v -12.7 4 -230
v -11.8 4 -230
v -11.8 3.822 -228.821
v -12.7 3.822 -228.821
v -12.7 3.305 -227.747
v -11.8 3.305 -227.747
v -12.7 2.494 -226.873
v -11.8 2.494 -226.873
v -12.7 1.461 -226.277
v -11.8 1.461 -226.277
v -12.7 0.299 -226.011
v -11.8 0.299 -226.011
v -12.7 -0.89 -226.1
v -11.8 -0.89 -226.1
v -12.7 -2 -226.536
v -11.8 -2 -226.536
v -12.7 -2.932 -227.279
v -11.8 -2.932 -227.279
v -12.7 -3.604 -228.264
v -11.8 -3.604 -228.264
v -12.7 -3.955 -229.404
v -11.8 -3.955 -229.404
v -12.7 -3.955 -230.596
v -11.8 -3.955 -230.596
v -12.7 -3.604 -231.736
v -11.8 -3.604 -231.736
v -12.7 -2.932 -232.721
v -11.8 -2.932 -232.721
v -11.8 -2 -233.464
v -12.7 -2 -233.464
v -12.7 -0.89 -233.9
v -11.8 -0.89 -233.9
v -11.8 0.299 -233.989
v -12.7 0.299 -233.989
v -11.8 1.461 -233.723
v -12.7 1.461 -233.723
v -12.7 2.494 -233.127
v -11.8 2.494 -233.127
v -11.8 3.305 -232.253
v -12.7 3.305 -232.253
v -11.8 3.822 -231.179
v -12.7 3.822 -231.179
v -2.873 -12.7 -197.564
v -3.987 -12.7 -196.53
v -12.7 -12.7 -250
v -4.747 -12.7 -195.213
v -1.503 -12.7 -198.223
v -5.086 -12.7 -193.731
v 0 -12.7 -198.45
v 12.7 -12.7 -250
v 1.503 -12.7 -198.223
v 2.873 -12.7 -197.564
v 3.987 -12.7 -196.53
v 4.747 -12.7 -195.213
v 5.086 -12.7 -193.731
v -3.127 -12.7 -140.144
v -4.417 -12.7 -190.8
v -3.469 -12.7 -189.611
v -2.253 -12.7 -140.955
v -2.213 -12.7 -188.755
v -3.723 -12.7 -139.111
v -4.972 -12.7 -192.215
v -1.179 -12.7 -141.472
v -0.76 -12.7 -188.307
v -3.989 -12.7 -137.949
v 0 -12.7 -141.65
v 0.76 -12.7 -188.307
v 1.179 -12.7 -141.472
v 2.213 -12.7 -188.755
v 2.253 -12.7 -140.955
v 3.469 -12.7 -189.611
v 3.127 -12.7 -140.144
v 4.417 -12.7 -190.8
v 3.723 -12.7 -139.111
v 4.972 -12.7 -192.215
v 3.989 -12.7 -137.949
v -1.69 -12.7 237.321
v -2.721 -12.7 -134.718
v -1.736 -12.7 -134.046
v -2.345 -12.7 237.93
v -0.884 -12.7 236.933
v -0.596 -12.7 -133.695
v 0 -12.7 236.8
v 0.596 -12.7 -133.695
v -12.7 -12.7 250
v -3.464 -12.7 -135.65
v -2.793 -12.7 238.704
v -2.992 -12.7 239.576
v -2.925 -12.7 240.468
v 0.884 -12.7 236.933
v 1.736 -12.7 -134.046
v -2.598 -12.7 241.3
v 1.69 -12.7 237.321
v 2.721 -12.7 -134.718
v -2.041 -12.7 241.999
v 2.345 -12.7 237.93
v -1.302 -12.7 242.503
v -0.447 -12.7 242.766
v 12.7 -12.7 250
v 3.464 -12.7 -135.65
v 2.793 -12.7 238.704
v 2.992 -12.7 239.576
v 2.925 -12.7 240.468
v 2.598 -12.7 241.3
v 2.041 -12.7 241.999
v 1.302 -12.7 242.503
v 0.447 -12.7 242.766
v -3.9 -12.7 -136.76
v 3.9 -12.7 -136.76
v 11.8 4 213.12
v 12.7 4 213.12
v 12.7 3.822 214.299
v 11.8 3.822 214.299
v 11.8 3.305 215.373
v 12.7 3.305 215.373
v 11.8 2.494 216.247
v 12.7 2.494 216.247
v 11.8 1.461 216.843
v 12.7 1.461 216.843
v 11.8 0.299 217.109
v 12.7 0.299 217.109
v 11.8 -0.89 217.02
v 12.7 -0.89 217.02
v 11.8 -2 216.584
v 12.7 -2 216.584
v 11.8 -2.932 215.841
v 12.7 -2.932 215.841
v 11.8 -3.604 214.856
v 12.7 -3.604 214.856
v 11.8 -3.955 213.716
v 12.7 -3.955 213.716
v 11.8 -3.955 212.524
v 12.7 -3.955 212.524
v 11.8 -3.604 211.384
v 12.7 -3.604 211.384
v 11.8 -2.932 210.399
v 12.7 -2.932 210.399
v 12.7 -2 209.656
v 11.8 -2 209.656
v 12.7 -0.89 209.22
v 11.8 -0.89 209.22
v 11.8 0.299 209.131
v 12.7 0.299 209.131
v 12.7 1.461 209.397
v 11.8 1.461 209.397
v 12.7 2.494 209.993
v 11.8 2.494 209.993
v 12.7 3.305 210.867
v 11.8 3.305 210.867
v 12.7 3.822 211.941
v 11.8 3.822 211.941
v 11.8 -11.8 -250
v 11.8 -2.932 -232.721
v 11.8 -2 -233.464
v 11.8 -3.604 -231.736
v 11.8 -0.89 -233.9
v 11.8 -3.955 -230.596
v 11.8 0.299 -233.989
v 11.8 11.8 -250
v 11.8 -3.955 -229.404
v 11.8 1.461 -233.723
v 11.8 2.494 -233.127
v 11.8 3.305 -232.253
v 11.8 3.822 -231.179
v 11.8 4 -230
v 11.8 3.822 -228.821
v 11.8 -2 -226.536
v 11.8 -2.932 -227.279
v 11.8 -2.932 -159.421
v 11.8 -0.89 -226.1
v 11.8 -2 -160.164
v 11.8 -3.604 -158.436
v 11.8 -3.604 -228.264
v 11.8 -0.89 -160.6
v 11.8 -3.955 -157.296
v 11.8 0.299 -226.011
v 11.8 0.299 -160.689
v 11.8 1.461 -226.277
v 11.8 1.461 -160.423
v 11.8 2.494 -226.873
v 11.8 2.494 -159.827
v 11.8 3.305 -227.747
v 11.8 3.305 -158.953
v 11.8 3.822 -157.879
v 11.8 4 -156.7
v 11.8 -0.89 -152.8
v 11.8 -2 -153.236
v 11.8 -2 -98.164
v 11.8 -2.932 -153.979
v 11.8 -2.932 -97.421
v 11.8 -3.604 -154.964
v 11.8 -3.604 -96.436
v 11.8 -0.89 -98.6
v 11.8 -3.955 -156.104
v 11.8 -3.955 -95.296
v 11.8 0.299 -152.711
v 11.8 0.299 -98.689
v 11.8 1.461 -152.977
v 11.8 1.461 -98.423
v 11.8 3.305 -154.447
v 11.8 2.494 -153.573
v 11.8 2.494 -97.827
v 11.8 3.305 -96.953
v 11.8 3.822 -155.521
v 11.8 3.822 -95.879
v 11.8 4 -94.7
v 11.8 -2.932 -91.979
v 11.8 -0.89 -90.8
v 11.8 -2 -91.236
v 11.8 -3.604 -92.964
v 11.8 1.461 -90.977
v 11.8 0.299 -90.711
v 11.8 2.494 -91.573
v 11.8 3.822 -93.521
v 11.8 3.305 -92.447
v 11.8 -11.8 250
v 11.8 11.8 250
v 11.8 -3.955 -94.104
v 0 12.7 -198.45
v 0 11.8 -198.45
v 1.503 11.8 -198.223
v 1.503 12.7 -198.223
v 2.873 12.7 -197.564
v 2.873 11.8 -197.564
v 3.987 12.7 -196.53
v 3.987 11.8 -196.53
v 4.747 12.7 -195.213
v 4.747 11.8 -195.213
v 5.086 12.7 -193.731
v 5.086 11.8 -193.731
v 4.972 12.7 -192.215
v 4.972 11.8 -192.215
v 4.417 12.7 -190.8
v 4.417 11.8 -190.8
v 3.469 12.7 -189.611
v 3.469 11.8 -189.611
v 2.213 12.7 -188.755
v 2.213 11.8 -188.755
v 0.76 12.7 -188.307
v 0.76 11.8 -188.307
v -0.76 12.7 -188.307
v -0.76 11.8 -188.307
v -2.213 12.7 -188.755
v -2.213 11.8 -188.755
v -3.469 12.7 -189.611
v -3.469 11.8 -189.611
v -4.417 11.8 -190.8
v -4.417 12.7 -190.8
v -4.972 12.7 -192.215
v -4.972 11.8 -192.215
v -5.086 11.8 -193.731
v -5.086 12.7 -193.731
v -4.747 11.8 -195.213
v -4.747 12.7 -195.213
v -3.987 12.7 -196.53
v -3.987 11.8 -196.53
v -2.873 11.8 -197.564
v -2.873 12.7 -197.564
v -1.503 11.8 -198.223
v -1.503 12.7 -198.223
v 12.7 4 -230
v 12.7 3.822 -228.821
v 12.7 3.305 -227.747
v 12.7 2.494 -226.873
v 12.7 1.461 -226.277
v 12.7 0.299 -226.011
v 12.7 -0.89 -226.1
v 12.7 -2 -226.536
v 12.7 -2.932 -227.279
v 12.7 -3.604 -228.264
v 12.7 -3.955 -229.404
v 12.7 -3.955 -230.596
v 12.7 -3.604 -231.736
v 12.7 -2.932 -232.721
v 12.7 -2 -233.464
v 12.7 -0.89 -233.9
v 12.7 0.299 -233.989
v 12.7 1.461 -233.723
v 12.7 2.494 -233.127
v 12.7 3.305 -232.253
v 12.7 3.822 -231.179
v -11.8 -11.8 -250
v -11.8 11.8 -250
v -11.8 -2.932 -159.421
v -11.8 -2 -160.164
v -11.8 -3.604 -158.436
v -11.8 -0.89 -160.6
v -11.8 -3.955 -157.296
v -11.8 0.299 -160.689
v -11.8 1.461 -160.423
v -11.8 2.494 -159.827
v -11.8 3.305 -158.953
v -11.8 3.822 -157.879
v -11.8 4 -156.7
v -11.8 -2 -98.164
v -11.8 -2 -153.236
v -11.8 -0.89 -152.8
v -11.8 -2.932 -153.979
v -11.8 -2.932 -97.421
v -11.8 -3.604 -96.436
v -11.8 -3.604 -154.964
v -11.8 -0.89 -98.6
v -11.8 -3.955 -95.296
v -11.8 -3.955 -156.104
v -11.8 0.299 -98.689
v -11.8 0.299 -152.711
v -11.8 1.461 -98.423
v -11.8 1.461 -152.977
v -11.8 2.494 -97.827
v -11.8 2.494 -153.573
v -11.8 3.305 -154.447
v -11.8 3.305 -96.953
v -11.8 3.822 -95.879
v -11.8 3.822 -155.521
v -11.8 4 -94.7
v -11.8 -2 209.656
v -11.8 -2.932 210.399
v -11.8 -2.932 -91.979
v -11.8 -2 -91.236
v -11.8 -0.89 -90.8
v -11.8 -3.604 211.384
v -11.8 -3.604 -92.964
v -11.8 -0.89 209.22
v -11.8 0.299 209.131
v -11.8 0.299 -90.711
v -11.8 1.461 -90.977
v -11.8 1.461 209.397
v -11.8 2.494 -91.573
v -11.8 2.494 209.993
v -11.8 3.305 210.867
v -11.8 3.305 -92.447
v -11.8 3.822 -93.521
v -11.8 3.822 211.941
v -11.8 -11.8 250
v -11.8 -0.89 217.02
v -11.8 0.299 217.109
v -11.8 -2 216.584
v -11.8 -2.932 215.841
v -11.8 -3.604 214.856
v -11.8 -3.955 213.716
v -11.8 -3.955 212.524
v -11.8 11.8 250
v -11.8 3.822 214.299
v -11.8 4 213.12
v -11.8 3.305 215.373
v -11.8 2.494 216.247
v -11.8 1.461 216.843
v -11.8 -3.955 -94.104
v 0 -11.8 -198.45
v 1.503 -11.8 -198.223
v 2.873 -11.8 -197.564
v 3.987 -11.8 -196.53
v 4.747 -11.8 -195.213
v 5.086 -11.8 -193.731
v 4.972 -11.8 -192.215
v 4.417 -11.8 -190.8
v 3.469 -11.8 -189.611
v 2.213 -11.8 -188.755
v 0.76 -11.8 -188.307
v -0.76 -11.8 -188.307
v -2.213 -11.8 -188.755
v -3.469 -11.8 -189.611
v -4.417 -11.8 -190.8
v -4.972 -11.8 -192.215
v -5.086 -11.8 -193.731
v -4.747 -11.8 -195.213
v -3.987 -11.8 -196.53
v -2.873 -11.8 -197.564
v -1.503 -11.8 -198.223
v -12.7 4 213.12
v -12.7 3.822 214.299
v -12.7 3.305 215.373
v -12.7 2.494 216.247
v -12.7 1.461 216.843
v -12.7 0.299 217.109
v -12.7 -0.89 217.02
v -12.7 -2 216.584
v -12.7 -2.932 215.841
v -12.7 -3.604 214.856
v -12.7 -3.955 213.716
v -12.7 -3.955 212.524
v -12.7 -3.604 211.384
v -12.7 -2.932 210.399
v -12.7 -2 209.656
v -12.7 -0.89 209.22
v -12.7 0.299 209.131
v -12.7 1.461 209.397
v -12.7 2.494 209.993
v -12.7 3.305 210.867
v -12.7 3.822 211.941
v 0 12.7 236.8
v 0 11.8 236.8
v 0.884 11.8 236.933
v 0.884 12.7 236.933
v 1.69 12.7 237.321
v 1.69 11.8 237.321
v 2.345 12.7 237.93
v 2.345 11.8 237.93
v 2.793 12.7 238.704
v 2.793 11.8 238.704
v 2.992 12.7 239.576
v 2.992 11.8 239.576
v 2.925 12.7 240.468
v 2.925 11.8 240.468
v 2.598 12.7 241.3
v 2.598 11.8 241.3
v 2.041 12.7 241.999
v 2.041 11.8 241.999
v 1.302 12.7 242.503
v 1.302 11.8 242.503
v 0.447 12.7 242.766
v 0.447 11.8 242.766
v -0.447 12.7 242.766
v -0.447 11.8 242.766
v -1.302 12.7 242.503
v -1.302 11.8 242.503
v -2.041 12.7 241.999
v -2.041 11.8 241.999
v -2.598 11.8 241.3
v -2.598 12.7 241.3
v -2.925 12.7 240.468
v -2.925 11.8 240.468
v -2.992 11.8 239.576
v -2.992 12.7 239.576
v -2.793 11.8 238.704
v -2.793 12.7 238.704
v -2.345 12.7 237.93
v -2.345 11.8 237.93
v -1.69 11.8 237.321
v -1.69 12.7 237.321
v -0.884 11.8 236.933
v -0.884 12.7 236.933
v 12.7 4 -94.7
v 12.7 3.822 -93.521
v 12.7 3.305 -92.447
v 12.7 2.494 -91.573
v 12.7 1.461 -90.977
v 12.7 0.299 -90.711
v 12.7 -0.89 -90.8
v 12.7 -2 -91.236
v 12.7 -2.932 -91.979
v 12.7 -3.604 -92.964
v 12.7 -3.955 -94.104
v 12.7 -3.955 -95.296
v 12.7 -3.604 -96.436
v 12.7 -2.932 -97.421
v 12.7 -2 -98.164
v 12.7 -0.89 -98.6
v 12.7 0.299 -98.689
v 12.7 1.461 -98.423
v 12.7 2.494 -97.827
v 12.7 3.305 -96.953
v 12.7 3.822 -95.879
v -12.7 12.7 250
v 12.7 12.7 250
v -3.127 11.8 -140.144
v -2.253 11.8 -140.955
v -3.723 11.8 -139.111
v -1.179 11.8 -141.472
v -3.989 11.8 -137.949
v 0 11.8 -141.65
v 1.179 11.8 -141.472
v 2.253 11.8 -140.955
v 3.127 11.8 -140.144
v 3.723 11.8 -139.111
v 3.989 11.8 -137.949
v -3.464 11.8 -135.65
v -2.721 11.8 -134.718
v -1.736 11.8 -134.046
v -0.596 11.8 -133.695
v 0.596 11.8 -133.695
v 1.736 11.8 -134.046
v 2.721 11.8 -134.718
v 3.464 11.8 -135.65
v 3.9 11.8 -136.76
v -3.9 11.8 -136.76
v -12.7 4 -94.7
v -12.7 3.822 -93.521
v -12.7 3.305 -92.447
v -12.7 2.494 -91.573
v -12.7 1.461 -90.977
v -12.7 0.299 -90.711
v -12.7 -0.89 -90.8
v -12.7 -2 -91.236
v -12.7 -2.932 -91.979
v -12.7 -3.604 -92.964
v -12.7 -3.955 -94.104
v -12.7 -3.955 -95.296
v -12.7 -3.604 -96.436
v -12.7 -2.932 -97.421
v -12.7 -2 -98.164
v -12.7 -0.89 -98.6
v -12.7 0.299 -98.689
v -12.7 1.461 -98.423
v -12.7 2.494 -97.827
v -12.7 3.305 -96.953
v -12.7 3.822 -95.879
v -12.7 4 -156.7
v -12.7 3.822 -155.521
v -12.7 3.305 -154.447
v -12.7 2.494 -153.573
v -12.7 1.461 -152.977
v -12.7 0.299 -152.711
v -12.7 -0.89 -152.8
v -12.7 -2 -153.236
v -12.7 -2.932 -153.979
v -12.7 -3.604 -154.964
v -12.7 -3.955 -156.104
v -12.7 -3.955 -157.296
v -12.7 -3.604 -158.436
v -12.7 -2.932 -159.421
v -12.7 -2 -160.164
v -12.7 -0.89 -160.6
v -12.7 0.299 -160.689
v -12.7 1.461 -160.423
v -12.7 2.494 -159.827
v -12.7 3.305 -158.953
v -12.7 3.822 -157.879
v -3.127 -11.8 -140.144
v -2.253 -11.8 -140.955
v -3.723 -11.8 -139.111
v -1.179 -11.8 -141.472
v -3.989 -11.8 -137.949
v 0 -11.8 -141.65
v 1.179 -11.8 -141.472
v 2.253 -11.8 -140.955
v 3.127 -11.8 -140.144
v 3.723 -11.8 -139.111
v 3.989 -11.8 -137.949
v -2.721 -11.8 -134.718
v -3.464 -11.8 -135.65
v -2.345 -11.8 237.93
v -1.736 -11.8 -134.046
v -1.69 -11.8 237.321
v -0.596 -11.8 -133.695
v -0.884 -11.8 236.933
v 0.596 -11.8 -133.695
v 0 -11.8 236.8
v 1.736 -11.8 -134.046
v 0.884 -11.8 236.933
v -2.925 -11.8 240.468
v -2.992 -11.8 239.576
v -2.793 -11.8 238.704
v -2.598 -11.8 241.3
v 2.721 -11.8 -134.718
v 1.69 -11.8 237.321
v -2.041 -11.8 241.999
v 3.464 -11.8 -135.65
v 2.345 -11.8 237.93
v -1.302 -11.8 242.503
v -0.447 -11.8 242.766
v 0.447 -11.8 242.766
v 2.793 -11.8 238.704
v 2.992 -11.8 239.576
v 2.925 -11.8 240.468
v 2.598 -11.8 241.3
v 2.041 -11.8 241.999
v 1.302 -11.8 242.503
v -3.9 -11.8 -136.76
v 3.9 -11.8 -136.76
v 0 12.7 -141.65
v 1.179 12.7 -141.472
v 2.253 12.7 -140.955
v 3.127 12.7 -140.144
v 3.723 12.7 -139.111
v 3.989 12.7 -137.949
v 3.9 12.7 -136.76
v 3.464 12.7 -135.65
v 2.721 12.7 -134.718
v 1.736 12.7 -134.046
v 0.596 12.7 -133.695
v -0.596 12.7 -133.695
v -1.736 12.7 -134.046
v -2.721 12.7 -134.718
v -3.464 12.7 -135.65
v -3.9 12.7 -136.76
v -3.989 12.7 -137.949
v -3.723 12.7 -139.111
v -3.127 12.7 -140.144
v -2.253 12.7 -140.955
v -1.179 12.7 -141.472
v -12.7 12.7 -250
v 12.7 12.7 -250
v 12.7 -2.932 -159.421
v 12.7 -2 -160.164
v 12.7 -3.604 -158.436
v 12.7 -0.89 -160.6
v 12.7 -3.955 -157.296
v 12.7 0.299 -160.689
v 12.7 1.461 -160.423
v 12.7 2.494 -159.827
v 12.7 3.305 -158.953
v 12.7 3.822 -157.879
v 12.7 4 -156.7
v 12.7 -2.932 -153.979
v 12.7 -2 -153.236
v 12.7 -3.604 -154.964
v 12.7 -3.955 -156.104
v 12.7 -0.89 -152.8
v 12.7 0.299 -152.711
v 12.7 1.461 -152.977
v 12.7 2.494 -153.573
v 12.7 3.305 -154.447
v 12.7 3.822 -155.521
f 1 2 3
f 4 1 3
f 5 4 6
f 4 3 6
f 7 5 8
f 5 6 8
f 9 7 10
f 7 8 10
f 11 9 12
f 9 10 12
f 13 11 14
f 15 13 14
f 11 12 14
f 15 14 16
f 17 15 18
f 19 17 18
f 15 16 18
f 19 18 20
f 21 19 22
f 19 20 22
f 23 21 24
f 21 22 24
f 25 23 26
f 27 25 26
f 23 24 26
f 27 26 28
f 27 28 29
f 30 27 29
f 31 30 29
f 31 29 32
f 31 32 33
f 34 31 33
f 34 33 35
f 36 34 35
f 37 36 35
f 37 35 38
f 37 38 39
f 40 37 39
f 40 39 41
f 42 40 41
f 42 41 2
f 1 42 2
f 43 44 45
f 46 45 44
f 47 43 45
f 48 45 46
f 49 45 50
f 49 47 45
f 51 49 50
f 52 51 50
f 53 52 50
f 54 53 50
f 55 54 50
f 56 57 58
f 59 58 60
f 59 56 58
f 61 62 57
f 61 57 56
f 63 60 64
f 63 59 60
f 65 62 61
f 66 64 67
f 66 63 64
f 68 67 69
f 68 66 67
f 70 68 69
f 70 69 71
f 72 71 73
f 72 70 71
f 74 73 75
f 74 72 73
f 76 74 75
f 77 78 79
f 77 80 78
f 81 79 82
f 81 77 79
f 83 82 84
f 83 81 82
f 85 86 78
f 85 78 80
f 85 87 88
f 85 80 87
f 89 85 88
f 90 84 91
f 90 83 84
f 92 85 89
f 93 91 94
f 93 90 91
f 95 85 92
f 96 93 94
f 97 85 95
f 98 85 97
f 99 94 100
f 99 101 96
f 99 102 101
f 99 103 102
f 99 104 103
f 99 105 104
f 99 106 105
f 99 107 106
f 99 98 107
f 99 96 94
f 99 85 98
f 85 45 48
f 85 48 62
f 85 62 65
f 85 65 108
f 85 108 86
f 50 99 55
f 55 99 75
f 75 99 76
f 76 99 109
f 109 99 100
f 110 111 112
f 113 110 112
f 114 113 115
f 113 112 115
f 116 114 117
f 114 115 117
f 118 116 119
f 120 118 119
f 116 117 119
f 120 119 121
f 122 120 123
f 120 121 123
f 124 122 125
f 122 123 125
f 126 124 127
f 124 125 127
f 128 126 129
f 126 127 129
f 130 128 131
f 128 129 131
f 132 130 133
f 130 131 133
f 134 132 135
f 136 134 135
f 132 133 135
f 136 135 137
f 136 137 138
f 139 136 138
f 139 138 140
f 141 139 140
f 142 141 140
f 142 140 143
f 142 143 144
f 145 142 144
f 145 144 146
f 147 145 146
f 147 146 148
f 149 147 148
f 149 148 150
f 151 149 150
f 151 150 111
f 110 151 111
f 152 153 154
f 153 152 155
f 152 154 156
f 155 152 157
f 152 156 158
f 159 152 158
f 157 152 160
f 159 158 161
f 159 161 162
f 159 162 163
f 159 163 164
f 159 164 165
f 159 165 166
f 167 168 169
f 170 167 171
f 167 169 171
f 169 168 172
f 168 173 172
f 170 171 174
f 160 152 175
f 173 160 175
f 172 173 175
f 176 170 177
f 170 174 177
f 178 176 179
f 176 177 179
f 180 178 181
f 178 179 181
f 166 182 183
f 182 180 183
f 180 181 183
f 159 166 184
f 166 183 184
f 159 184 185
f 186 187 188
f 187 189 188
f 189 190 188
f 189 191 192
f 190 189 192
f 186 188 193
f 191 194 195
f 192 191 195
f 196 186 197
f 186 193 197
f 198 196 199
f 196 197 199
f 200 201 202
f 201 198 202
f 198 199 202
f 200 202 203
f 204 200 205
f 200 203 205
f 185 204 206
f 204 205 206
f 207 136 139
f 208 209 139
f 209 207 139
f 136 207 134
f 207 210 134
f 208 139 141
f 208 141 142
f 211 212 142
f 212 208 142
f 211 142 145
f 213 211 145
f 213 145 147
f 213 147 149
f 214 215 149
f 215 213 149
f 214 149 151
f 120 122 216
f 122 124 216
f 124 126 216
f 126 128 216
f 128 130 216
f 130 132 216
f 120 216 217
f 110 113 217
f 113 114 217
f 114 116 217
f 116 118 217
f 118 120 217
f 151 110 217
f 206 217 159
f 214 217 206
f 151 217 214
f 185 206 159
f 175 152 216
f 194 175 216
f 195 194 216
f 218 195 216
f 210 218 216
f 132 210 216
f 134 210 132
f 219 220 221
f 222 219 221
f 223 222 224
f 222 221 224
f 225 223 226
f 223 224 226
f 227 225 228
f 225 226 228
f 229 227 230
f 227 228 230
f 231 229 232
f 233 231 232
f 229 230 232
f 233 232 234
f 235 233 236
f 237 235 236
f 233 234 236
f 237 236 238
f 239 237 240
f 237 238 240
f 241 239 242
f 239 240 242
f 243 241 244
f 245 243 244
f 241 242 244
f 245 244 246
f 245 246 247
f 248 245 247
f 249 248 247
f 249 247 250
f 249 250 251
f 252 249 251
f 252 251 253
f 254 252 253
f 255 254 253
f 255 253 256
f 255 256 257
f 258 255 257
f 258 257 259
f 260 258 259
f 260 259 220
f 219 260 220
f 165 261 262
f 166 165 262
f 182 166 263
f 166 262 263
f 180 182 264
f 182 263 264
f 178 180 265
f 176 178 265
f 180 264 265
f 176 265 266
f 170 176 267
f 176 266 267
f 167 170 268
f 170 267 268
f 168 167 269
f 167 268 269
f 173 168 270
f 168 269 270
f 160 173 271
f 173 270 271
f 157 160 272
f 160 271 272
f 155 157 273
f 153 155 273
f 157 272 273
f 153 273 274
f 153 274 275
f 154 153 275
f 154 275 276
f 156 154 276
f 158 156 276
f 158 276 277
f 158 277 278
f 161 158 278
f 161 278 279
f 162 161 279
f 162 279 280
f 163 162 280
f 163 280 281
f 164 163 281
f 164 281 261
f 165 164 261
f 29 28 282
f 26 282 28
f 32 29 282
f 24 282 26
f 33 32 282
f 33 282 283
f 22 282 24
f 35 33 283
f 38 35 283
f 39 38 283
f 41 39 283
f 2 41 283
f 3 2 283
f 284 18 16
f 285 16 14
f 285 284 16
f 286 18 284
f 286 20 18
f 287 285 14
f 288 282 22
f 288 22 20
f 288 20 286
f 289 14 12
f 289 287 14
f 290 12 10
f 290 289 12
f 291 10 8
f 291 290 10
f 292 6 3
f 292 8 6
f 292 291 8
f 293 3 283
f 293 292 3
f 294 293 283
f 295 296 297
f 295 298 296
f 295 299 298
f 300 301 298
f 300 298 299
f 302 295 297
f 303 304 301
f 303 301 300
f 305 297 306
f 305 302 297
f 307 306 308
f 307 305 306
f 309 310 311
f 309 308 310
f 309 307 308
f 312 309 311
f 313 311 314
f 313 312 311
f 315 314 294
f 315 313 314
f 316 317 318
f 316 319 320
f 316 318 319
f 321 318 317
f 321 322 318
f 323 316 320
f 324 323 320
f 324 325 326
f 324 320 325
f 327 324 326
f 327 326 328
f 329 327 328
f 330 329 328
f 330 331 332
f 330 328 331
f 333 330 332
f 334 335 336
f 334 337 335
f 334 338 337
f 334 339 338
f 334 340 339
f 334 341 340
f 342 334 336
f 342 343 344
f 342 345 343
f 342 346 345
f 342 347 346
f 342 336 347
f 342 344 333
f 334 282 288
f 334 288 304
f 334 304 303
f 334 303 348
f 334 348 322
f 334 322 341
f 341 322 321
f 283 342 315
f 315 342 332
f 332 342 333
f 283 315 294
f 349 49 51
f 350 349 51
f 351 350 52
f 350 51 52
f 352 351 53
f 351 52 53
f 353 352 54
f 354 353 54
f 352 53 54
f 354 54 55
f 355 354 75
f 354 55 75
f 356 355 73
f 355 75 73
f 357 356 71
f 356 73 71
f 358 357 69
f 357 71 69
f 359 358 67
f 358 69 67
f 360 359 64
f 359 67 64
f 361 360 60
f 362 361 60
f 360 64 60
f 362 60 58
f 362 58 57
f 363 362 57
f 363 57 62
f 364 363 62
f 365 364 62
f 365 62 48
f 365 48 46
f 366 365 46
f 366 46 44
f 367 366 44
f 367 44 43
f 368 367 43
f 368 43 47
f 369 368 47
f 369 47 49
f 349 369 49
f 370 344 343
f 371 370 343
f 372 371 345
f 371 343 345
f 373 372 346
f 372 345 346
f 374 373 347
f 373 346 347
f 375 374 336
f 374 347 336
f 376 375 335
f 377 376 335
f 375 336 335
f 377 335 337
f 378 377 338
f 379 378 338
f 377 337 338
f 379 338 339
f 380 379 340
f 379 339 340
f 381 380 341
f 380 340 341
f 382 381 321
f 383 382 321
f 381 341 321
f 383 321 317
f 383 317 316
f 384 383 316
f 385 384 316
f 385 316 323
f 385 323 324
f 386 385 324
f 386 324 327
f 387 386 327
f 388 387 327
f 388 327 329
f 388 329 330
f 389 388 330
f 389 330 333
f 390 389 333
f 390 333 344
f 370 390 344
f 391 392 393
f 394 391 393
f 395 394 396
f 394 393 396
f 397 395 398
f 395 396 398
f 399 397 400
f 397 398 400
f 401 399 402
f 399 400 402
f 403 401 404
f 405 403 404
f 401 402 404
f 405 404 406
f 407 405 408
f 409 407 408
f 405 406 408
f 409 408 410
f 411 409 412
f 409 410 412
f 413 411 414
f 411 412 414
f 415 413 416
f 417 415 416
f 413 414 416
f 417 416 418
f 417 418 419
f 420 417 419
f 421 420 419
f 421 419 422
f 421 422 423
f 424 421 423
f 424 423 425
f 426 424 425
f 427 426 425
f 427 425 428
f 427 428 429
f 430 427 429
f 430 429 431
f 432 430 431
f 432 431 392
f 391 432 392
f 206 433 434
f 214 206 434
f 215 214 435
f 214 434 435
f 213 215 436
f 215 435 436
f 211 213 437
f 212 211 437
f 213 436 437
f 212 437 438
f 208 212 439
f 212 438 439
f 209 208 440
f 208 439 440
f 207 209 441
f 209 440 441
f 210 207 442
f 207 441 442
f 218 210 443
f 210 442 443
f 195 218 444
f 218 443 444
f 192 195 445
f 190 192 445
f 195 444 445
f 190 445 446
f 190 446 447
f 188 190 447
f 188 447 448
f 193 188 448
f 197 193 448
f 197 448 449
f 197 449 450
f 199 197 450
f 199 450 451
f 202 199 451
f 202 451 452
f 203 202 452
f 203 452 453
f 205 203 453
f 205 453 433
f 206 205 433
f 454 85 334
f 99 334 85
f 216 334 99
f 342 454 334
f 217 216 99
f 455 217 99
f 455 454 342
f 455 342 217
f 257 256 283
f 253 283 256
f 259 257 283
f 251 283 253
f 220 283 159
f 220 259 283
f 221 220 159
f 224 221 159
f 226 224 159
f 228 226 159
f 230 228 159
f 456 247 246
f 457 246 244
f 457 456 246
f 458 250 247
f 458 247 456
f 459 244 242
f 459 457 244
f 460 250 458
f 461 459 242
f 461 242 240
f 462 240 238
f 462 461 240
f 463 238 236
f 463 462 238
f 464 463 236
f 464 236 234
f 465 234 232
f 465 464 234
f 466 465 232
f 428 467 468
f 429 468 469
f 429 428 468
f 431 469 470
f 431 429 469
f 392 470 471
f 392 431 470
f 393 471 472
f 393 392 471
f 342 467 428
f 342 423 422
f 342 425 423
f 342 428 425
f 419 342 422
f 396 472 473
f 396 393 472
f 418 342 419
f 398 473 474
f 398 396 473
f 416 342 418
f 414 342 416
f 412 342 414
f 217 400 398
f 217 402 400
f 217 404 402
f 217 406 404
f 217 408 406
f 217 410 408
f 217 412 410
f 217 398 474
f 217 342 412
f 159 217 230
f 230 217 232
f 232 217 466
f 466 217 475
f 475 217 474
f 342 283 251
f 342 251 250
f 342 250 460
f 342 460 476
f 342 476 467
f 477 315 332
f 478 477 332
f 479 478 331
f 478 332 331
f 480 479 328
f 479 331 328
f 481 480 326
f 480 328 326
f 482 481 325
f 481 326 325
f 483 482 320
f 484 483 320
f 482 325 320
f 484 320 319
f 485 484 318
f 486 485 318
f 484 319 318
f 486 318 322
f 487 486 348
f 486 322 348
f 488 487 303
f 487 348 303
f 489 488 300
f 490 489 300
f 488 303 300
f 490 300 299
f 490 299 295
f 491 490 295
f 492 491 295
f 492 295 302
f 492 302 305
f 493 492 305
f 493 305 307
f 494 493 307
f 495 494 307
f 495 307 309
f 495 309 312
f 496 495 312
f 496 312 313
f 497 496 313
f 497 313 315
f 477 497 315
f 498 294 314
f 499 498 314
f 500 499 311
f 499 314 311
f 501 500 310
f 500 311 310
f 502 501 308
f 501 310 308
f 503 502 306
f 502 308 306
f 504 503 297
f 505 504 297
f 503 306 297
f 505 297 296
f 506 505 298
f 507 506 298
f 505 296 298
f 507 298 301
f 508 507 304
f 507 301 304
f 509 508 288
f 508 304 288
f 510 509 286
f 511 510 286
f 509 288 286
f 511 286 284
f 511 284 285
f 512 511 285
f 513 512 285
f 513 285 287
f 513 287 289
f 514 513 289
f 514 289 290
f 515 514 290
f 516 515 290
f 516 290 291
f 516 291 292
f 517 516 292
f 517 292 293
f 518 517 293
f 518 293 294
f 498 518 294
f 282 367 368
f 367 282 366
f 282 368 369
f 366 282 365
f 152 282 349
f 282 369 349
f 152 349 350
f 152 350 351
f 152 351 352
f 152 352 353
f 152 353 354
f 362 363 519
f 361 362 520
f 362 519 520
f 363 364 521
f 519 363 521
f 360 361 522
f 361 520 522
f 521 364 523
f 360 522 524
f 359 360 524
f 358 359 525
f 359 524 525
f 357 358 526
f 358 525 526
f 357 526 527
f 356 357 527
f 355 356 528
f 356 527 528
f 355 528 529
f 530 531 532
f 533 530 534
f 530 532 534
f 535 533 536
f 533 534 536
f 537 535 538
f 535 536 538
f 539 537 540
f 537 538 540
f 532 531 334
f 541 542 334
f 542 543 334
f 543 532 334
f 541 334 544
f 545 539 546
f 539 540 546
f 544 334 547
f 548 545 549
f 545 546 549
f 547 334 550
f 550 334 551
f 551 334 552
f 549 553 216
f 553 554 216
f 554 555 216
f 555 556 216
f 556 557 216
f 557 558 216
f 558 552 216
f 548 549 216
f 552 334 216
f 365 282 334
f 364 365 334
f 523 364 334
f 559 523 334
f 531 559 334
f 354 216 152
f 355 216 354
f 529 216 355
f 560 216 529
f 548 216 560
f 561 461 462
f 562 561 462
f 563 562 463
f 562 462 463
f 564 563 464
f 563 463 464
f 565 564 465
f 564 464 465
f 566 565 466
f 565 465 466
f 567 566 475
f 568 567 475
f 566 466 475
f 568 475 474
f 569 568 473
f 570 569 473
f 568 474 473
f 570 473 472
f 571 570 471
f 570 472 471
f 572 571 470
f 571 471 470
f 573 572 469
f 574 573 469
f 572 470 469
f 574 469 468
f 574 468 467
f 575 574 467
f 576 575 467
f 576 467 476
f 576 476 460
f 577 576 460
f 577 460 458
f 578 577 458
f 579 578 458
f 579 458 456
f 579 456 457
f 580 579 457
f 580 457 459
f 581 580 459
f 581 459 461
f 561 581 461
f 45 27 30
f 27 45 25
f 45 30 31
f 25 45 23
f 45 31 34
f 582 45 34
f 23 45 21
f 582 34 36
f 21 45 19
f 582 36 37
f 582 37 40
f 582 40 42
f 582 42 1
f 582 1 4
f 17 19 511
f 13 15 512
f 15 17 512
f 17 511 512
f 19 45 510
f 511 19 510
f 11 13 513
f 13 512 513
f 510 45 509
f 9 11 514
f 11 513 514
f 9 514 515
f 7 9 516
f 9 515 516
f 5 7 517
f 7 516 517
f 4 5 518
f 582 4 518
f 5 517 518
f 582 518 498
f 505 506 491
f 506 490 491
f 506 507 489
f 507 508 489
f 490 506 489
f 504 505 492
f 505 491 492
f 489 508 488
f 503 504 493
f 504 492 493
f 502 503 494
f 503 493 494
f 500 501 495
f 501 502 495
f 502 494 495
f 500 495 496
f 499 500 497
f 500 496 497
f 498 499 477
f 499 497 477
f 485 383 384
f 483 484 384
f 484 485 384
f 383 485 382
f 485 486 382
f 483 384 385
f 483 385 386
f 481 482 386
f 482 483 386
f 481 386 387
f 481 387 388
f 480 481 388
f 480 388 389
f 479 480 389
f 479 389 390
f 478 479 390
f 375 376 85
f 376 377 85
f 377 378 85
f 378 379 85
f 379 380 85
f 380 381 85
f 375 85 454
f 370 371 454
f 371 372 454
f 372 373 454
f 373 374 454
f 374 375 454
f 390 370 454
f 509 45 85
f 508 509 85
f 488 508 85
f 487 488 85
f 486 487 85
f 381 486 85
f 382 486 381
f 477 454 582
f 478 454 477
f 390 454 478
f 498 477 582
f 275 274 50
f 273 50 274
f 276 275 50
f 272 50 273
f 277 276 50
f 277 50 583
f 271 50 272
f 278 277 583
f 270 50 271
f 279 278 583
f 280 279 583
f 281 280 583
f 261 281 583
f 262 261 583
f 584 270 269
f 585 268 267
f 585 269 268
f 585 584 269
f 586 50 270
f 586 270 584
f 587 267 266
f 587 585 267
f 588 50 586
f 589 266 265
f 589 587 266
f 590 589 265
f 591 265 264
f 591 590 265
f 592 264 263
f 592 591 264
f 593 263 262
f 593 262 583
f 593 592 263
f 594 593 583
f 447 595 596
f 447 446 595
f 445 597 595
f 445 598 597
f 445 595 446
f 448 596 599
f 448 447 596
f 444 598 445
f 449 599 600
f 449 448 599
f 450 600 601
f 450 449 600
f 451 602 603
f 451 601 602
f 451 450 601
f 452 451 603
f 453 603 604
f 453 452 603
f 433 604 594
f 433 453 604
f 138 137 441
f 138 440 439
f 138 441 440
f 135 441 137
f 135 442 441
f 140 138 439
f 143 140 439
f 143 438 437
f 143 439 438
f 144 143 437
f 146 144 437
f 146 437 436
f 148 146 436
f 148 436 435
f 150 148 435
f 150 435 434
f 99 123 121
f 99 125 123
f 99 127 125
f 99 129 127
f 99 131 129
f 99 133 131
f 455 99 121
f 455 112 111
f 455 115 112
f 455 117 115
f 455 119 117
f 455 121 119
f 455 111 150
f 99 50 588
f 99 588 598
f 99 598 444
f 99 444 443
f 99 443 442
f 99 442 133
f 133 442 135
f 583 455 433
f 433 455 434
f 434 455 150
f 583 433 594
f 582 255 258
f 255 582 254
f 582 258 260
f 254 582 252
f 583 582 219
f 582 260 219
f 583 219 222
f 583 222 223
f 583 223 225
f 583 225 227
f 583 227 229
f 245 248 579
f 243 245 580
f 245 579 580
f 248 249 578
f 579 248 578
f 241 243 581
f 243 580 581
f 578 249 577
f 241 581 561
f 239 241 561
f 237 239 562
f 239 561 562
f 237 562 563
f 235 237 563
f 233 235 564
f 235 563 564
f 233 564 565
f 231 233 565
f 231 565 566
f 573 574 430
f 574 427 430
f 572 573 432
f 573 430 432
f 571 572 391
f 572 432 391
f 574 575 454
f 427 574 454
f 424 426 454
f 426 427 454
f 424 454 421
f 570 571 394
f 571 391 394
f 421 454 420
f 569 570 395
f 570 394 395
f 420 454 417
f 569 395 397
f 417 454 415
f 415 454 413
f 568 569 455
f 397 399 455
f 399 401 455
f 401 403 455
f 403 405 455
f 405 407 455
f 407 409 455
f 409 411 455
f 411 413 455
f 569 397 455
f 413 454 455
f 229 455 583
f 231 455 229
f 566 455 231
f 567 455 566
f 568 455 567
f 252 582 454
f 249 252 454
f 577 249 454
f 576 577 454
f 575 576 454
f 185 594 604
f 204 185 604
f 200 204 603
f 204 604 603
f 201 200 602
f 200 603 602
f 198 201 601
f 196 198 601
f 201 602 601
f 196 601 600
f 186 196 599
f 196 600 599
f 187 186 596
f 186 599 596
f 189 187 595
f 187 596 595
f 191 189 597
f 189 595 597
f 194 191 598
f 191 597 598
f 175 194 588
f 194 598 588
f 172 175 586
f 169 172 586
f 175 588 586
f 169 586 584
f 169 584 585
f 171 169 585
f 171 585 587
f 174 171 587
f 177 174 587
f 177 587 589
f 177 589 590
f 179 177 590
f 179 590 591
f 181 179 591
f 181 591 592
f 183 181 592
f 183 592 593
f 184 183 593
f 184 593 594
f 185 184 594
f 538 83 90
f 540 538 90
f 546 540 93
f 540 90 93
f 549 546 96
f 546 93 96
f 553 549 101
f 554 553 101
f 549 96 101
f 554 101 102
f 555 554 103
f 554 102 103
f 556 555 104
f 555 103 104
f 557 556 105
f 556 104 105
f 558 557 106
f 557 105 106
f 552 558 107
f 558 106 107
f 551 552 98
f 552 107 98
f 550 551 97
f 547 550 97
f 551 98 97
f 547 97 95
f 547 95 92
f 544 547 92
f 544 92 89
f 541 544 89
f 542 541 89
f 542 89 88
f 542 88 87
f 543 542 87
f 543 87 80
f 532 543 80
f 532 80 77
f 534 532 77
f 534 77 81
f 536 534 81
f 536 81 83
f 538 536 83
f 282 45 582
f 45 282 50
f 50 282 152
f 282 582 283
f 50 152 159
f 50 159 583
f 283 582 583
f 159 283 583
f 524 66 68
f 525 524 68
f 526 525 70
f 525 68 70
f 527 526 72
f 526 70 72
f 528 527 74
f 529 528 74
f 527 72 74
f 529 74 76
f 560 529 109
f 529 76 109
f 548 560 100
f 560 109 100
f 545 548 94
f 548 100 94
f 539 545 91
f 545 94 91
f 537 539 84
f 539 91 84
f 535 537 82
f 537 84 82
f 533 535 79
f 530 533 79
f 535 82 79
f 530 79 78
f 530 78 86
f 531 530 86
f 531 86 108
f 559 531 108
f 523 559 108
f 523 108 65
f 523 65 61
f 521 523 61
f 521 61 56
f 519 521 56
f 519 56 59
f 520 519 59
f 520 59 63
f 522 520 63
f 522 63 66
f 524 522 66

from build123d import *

# Parameters (mm, degrees)
SKETCH1_W           = 25.4
SKETCH1_H           = 25.4
SKETCH1_W_2         = 23.6
SKETCH1_H_2         = 23.6
EXTRUDE_THIN1_DEPTH = 250
SKETCH2_R           = 4
CUT_EXTRUDE1_DEPTH  = 252.607730406
SKETCH3_R           = 3
SKETCH3_R_2         = 4
SKETCH3_R_3         = 5.1
CUT_EXTRUDE2_DEPTH  = 252.607730406


with BuildPart() as part:
    # Sketch1 → Extrude-Thin1 (new, symmetric)
    with BuildSketch(Plane.XY):
        Rectangle(SKETCH1_W, SKETCH1_H)
        Rectangle(SKETCH1_W_2, SKETCH1_H_2, mode=Mode.SUBTRACT)
    extrude(amount=EXTRUDE_THIN1_DEPTH, both=True)

    # Sketch2 → Cut-Extrude1 (cut, through all)
    with BuildSketch(Plane(origin=(12.7, 0, 0), x_dir=(0, 0, -1), z_dir=(1, 0, 0))):
        with Locations(Location((156.7, 0, 0), (0, 0, 90))):
            Circle(SKETCH2_R)
        with Locations(Location((230, 0, 0), (0, 0, 90))):
            Circle(SKETCH2_R)
        with Locations(Location((94.7, 0, 0), (0, 0, 90))):
            Circle(SKETCH2_R)
        with Locations(Location((-213.12, 0, 0), (0, 0, 90))):
            Circle(SKETCH2_R)
    extrude(amount=-CUT_EXTRUDE1_DEPTH, mode=Mode.SUBTRACT)

    # Sketch3 → Cut-Extrude2 (cut, through all)
    with BuildSketch(Plane.XZ.offset(12.7)):
        with Locations(Location((0, 239.8, 0), (0, 0, 270))):
            Circle(SKETCH3_R)
        with Locations(Location((0, -137.65, 0), (0, 0, 270))):
            Circle(SKETCH3_R_2)
        with Locations(Location((0, -193.35, 0), (0, 0, 270))):
            Circle(SKETCH3_R_3)
    extrude(amount=-CUT_EXTRUDE2_DEPTH, mode=Mode.SUBTRACT)


solid = part.part
